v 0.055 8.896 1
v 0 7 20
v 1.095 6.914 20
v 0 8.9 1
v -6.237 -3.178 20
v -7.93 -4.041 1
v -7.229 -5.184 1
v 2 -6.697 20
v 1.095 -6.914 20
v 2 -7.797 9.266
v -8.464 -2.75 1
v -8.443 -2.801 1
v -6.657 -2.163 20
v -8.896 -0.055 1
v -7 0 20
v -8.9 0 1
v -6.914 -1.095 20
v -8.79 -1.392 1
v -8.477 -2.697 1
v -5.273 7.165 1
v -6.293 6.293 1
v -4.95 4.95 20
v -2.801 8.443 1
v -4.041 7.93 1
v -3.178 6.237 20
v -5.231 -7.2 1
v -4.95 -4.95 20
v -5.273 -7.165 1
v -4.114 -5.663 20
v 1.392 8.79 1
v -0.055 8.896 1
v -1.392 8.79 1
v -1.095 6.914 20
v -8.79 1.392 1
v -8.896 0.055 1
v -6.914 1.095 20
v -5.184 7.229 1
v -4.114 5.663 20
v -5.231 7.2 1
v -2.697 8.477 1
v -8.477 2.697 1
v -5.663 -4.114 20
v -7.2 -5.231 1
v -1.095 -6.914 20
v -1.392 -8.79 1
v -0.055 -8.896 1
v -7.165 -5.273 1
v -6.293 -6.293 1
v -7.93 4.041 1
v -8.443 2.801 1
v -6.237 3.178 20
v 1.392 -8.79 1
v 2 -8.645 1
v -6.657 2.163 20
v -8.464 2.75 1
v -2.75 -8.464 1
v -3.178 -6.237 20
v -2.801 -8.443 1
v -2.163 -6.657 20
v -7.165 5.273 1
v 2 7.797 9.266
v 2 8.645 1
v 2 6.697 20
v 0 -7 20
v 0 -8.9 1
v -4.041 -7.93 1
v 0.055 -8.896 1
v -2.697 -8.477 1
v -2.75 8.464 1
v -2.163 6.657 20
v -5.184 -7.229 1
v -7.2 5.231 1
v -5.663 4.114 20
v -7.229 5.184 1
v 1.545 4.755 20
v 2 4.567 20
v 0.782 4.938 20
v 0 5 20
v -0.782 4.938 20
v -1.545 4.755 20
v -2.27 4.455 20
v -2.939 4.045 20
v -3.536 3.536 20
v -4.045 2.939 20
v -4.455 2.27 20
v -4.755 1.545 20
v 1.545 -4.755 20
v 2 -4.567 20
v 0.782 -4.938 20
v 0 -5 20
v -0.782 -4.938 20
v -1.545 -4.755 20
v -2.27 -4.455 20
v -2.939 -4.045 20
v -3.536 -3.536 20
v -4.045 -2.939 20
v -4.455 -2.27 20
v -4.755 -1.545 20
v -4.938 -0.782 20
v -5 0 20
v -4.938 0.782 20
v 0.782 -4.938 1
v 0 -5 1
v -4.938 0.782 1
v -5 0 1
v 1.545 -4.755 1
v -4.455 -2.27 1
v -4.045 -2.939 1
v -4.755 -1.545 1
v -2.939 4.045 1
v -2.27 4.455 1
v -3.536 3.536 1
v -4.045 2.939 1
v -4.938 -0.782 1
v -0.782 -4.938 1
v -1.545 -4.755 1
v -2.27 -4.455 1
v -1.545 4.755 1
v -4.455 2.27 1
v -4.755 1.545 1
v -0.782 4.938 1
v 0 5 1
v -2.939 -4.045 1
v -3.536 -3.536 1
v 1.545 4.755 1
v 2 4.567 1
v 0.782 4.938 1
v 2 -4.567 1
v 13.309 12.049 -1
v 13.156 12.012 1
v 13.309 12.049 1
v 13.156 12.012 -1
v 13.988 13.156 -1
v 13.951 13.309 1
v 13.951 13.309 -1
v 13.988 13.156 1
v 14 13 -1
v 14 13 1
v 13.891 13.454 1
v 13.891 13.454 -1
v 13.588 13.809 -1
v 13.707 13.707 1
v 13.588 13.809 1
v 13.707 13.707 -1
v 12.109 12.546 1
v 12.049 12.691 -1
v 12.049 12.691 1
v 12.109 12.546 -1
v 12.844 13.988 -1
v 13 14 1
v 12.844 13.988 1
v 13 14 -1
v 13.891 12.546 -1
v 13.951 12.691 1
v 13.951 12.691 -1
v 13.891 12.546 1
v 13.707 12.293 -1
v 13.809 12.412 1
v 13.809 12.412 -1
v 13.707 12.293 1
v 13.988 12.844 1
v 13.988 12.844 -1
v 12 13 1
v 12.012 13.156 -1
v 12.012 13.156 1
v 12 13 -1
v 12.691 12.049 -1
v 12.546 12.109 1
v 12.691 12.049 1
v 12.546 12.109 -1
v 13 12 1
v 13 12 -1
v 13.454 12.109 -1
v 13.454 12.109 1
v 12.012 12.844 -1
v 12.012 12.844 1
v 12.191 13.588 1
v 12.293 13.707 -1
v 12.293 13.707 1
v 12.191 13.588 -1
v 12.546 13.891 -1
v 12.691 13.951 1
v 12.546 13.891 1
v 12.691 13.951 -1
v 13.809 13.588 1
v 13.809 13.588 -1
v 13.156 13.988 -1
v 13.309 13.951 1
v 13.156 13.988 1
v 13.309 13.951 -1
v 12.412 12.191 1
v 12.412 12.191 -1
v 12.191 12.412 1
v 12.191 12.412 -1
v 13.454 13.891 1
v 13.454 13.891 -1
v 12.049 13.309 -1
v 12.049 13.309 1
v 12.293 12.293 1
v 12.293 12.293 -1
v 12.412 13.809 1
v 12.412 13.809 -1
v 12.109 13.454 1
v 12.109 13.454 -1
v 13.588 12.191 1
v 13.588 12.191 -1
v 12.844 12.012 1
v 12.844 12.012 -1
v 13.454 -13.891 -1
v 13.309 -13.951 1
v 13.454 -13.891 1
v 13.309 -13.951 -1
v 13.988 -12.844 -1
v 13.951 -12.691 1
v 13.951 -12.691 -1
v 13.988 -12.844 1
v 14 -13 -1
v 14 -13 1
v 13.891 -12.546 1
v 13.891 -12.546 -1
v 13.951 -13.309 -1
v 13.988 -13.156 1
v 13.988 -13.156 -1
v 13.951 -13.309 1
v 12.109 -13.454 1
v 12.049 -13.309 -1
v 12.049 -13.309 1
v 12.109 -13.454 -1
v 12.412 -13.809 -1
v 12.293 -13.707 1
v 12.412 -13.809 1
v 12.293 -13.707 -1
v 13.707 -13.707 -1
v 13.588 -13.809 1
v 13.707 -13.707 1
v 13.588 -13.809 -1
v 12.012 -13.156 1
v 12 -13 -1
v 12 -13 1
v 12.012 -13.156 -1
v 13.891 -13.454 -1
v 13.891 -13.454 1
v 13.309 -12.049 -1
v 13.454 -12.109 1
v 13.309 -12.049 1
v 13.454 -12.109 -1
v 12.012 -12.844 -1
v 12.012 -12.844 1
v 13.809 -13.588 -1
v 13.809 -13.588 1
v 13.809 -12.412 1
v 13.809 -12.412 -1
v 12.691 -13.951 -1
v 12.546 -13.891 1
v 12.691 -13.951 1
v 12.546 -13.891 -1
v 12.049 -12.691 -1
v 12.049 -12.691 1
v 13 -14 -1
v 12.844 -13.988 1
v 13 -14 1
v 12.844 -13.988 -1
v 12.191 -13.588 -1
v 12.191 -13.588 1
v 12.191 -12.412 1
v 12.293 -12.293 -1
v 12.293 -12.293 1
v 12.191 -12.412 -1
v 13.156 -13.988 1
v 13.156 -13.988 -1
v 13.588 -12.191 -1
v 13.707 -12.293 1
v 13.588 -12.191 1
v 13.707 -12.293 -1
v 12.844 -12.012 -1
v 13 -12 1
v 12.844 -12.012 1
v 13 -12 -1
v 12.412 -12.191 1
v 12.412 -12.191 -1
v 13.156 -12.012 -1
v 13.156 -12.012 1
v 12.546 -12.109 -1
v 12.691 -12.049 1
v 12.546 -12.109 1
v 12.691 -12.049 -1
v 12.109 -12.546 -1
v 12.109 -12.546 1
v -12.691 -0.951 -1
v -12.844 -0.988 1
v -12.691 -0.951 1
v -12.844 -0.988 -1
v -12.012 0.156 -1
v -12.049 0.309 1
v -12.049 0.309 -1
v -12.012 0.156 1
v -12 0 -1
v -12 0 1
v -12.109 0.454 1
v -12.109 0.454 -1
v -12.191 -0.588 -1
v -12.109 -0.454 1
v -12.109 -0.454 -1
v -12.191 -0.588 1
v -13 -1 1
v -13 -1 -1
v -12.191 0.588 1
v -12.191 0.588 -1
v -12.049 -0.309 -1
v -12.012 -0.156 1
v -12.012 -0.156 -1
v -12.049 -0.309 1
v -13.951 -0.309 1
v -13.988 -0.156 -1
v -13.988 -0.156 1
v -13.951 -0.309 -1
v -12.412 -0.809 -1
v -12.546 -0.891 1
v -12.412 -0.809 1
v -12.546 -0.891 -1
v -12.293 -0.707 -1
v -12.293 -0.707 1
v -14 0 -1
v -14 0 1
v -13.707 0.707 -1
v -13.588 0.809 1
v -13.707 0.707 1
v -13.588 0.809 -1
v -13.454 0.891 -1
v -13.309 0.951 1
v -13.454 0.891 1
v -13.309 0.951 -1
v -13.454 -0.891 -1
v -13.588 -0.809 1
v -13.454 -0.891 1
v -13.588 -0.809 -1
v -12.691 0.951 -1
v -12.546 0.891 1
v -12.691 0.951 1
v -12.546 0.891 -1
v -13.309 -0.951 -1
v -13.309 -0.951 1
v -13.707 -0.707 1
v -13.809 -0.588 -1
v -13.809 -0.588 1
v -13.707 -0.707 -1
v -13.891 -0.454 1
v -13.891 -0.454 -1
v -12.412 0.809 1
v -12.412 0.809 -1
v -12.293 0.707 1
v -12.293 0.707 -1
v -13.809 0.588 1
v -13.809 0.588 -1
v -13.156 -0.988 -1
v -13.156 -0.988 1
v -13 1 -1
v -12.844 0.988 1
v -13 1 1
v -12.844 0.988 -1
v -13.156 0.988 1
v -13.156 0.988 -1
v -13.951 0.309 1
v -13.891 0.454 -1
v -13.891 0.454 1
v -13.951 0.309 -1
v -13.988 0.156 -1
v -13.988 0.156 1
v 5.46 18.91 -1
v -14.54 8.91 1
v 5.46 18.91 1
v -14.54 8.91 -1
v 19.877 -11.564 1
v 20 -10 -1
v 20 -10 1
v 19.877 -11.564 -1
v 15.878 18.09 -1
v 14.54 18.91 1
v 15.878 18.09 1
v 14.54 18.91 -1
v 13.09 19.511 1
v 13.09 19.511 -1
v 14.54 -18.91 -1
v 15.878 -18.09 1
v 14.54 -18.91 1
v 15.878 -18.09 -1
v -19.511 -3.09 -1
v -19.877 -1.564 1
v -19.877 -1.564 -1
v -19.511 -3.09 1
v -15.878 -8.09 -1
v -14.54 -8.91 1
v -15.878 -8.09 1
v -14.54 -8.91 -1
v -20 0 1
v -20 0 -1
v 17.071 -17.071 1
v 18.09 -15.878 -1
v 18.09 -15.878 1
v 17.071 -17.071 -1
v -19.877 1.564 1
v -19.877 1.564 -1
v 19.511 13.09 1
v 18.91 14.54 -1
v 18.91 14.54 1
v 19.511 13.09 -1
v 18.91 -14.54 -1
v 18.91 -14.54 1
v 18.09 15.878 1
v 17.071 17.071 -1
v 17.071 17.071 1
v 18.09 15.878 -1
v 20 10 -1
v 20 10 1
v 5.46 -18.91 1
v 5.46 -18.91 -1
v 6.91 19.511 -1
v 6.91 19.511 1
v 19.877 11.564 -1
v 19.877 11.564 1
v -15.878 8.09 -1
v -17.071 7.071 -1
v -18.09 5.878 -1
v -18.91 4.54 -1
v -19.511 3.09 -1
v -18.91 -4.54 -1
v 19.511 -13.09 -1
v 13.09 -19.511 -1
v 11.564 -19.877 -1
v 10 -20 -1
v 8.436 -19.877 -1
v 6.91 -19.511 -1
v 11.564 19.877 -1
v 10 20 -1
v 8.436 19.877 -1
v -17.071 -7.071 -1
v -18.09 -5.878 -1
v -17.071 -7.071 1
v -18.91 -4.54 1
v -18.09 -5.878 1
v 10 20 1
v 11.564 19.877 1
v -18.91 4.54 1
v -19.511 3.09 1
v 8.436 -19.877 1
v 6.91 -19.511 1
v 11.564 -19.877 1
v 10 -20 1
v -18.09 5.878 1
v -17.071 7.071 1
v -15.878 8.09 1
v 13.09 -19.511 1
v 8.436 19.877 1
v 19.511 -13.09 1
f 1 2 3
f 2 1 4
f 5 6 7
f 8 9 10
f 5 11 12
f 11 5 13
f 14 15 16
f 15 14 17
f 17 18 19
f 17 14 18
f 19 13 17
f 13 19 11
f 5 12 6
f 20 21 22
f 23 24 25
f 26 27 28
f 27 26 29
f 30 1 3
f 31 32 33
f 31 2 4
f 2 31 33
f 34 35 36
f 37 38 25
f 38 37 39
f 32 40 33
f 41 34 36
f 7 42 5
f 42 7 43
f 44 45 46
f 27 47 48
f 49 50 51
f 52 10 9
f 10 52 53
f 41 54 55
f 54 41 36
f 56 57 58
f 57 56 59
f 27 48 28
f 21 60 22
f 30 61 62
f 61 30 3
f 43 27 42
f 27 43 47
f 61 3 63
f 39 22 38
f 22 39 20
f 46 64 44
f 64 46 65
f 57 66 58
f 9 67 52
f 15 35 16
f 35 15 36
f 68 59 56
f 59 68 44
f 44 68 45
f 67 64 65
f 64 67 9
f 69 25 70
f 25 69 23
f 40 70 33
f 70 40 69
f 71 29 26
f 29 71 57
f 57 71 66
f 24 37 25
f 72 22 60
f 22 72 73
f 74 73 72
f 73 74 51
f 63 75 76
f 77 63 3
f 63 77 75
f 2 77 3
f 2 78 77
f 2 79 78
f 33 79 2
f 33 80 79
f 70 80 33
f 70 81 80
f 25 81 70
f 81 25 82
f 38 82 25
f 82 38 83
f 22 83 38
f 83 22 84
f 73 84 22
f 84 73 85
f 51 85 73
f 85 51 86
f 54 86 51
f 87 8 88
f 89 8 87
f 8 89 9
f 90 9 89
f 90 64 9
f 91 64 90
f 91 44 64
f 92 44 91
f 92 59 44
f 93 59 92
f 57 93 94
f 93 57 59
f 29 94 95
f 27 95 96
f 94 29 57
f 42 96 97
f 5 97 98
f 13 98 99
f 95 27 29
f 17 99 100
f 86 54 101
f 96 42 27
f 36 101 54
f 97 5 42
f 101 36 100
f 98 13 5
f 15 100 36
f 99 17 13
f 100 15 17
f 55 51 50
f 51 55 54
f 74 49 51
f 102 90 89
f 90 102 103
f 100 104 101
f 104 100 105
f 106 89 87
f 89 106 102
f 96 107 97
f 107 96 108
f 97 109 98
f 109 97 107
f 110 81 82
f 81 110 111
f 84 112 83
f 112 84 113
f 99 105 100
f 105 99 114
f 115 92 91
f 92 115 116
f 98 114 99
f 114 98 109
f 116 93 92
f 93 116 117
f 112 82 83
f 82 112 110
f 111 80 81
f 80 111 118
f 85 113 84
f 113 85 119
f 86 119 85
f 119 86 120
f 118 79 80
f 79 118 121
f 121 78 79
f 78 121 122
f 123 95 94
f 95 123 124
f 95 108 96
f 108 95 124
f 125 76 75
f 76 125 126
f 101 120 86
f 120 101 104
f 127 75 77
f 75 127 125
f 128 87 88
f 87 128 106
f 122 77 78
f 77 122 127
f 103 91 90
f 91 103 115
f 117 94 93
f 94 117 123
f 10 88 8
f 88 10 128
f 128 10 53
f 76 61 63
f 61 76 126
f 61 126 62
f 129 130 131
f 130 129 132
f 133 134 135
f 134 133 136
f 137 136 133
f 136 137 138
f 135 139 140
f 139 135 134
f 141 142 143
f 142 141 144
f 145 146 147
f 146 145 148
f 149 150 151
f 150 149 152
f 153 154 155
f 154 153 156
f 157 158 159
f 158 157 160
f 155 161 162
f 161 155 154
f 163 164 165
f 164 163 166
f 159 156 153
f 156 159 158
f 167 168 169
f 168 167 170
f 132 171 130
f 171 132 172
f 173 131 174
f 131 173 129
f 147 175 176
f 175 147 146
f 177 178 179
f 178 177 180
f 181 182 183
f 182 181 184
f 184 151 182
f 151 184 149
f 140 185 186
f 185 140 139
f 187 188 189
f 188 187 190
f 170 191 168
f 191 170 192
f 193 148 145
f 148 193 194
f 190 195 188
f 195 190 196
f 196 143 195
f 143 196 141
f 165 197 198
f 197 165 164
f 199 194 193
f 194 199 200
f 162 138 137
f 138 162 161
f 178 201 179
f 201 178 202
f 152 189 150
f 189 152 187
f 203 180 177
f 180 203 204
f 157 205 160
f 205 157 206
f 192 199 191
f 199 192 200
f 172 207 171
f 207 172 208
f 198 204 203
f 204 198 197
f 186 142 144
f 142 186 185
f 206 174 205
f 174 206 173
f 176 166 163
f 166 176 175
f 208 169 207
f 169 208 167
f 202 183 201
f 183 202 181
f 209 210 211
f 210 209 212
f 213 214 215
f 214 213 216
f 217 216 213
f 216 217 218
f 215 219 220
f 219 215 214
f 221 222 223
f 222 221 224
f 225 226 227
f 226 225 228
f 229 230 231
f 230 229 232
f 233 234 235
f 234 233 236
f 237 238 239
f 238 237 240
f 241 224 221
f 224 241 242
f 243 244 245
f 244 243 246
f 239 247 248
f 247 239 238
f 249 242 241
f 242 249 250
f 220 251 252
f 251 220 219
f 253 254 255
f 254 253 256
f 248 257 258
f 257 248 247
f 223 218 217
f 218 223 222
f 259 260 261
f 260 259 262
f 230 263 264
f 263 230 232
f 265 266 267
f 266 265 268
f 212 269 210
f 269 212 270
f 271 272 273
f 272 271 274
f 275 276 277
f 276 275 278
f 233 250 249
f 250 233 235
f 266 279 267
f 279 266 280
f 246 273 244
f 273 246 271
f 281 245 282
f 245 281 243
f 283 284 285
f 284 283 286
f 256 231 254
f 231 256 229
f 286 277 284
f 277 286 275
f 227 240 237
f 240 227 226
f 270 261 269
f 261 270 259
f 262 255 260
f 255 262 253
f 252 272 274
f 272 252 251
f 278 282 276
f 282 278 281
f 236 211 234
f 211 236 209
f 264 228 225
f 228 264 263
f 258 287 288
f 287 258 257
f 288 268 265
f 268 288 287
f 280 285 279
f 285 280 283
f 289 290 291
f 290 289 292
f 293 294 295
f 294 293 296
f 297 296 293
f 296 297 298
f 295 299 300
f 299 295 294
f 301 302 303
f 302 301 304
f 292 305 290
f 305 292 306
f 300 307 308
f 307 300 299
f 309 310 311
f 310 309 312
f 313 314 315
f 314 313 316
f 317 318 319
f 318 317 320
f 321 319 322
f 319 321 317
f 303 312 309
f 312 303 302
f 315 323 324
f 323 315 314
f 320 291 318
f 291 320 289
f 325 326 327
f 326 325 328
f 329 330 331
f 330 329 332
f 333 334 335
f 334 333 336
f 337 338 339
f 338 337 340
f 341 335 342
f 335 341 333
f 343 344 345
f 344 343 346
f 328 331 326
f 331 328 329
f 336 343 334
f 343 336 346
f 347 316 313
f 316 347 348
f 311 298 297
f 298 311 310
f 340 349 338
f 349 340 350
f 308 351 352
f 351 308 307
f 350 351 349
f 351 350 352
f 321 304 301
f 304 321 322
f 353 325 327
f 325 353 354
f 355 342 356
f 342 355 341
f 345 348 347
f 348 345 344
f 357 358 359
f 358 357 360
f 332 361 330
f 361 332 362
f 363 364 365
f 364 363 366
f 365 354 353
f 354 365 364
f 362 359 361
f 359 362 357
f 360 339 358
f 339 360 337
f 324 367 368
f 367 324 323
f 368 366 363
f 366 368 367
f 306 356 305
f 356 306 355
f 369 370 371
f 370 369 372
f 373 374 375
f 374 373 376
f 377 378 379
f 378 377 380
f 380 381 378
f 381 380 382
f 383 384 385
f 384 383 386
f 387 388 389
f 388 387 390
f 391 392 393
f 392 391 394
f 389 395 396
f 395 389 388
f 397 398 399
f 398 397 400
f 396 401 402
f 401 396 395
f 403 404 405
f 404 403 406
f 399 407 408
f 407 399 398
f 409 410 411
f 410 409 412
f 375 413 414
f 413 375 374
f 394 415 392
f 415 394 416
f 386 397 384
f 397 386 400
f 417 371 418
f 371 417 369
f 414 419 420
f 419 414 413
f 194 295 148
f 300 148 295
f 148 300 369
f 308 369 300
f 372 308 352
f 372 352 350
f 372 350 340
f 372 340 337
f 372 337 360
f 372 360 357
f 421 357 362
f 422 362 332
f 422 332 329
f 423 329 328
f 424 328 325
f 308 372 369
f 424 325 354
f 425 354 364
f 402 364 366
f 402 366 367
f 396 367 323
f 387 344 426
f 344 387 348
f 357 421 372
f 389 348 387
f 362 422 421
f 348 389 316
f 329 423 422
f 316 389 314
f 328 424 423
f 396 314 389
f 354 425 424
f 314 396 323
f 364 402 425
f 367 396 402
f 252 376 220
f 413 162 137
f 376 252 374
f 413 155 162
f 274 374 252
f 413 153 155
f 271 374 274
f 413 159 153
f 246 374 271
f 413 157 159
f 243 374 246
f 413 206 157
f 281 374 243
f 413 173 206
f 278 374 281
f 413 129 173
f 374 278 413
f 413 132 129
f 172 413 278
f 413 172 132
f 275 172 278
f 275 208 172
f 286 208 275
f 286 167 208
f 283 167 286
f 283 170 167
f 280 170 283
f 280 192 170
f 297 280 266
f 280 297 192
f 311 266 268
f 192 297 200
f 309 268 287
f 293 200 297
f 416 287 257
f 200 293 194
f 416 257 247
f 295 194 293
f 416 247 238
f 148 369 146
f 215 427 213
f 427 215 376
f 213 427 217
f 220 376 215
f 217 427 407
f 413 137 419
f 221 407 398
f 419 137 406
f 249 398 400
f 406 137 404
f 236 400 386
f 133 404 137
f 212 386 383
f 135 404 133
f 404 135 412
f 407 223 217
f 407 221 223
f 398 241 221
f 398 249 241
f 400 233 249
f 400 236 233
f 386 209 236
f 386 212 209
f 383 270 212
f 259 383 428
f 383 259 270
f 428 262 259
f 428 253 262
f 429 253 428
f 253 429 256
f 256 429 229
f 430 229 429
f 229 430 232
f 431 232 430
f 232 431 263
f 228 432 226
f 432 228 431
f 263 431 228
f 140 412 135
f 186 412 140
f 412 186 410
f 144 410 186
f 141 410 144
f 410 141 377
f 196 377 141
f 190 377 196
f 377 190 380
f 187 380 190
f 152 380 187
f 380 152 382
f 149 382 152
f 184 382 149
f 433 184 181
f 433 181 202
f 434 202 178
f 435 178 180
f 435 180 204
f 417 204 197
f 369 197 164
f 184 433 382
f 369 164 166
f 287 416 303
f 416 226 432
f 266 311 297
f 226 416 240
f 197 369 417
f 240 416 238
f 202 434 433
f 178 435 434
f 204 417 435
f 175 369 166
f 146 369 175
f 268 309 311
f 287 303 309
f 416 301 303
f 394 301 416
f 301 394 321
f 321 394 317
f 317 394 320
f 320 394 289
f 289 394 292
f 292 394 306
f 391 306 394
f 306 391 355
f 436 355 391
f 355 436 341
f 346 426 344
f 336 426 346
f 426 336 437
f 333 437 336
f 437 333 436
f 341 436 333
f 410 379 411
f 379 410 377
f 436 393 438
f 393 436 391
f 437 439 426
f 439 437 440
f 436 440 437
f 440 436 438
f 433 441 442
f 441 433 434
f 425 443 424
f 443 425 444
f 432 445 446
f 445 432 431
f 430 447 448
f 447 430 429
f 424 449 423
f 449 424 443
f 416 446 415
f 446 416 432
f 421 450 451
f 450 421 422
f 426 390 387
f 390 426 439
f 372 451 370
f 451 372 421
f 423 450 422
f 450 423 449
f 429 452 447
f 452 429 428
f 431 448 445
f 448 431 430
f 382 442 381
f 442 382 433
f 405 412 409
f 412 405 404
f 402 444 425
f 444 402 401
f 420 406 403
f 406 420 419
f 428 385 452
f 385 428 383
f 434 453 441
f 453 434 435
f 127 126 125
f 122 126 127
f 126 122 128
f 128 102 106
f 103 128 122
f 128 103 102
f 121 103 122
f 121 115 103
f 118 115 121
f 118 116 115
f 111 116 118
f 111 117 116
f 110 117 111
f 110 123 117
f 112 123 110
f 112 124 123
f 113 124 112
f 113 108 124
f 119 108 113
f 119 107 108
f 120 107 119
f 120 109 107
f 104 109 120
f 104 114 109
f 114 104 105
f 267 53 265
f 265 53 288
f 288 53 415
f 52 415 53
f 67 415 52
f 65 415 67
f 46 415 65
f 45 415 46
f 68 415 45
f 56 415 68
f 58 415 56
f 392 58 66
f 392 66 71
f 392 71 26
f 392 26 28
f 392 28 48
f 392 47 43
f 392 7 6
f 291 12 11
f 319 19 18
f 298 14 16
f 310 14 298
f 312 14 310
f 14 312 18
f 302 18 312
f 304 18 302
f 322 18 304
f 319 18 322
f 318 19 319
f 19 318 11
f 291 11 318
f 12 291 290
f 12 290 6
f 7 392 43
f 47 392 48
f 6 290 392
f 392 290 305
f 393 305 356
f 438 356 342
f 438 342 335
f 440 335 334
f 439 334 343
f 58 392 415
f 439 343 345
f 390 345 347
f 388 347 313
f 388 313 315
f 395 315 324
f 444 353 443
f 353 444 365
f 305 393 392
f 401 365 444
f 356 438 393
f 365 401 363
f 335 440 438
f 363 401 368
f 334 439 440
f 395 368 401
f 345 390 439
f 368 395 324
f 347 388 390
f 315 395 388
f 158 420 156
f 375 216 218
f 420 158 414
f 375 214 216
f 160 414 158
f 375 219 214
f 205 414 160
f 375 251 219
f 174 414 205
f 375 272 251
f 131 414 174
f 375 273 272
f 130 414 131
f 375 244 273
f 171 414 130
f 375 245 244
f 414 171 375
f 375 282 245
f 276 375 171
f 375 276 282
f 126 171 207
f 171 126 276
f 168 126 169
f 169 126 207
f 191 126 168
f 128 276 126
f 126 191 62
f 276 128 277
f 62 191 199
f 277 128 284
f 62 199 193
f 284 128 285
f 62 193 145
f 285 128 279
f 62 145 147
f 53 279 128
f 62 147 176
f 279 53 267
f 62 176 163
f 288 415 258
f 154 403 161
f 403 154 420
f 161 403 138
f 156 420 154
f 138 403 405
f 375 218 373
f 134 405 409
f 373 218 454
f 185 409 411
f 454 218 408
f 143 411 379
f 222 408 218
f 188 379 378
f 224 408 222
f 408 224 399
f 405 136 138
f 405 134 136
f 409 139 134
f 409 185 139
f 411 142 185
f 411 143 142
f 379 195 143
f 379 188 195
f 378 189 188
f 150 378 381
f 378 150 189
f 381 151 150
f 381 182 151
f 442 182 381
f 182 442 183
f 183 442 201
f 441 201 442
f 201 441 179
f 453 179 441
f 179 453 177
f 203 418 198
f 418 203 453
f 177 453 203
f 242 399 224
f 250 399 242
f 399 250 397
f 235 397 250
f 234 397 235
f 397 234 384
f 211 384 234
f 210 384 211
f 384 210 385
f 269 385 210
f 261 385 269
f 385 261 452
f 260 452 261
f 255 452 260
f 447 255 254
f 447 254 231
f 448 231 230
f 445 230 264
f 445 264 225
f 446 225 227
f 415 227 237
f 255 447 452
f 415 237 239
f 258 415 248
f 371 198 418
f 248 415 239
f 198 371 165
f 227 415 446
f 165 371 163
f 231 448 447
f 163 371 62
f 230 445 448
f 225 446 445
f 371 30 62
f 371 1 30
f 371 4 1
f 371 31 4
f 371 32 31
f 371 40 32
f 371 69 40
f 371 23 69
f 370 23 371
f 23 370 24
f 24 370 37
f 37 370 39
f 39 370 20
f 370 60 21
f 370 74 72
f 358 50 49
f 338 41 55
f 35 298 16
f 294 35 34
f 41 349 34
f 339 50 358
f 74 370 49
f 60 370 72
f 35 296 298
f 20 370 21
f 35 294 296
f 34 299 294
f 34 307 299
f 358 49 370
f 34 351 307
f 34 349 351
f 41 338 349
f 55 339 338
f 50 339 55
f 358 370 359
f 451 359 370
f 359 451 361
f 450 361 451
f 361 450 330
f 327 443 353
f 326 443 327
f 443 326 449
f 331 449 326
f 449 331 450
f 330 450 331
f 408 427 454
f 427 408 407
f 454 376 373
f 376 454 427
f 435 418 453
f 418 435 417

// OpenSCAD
$fn=40;

difference() {
difference() {
cylinder(r1=9, r2=7, h=20);
cylinder(r=5, h=60);
}

translate([2,-10,0]) cube([10,20,60]);
}

difference() {
hull() {
translate([10,10,0]) cylinder(d=20, h=2, center=true);
translate([10,-10,0]) cylinder(d=20, h=2, center=true);
translate([-10,0,0]) cylinder(d=20, h=2, center=true);
}

union() {
translate([13,13,0]) cylinder(d=2, h=20, center=true);
translate([13,-13,0]) cylinder(d=2, h=20, center=true);
translate([-13,0,0]) cylinder(d=2, h=20, center=true);
}
}
